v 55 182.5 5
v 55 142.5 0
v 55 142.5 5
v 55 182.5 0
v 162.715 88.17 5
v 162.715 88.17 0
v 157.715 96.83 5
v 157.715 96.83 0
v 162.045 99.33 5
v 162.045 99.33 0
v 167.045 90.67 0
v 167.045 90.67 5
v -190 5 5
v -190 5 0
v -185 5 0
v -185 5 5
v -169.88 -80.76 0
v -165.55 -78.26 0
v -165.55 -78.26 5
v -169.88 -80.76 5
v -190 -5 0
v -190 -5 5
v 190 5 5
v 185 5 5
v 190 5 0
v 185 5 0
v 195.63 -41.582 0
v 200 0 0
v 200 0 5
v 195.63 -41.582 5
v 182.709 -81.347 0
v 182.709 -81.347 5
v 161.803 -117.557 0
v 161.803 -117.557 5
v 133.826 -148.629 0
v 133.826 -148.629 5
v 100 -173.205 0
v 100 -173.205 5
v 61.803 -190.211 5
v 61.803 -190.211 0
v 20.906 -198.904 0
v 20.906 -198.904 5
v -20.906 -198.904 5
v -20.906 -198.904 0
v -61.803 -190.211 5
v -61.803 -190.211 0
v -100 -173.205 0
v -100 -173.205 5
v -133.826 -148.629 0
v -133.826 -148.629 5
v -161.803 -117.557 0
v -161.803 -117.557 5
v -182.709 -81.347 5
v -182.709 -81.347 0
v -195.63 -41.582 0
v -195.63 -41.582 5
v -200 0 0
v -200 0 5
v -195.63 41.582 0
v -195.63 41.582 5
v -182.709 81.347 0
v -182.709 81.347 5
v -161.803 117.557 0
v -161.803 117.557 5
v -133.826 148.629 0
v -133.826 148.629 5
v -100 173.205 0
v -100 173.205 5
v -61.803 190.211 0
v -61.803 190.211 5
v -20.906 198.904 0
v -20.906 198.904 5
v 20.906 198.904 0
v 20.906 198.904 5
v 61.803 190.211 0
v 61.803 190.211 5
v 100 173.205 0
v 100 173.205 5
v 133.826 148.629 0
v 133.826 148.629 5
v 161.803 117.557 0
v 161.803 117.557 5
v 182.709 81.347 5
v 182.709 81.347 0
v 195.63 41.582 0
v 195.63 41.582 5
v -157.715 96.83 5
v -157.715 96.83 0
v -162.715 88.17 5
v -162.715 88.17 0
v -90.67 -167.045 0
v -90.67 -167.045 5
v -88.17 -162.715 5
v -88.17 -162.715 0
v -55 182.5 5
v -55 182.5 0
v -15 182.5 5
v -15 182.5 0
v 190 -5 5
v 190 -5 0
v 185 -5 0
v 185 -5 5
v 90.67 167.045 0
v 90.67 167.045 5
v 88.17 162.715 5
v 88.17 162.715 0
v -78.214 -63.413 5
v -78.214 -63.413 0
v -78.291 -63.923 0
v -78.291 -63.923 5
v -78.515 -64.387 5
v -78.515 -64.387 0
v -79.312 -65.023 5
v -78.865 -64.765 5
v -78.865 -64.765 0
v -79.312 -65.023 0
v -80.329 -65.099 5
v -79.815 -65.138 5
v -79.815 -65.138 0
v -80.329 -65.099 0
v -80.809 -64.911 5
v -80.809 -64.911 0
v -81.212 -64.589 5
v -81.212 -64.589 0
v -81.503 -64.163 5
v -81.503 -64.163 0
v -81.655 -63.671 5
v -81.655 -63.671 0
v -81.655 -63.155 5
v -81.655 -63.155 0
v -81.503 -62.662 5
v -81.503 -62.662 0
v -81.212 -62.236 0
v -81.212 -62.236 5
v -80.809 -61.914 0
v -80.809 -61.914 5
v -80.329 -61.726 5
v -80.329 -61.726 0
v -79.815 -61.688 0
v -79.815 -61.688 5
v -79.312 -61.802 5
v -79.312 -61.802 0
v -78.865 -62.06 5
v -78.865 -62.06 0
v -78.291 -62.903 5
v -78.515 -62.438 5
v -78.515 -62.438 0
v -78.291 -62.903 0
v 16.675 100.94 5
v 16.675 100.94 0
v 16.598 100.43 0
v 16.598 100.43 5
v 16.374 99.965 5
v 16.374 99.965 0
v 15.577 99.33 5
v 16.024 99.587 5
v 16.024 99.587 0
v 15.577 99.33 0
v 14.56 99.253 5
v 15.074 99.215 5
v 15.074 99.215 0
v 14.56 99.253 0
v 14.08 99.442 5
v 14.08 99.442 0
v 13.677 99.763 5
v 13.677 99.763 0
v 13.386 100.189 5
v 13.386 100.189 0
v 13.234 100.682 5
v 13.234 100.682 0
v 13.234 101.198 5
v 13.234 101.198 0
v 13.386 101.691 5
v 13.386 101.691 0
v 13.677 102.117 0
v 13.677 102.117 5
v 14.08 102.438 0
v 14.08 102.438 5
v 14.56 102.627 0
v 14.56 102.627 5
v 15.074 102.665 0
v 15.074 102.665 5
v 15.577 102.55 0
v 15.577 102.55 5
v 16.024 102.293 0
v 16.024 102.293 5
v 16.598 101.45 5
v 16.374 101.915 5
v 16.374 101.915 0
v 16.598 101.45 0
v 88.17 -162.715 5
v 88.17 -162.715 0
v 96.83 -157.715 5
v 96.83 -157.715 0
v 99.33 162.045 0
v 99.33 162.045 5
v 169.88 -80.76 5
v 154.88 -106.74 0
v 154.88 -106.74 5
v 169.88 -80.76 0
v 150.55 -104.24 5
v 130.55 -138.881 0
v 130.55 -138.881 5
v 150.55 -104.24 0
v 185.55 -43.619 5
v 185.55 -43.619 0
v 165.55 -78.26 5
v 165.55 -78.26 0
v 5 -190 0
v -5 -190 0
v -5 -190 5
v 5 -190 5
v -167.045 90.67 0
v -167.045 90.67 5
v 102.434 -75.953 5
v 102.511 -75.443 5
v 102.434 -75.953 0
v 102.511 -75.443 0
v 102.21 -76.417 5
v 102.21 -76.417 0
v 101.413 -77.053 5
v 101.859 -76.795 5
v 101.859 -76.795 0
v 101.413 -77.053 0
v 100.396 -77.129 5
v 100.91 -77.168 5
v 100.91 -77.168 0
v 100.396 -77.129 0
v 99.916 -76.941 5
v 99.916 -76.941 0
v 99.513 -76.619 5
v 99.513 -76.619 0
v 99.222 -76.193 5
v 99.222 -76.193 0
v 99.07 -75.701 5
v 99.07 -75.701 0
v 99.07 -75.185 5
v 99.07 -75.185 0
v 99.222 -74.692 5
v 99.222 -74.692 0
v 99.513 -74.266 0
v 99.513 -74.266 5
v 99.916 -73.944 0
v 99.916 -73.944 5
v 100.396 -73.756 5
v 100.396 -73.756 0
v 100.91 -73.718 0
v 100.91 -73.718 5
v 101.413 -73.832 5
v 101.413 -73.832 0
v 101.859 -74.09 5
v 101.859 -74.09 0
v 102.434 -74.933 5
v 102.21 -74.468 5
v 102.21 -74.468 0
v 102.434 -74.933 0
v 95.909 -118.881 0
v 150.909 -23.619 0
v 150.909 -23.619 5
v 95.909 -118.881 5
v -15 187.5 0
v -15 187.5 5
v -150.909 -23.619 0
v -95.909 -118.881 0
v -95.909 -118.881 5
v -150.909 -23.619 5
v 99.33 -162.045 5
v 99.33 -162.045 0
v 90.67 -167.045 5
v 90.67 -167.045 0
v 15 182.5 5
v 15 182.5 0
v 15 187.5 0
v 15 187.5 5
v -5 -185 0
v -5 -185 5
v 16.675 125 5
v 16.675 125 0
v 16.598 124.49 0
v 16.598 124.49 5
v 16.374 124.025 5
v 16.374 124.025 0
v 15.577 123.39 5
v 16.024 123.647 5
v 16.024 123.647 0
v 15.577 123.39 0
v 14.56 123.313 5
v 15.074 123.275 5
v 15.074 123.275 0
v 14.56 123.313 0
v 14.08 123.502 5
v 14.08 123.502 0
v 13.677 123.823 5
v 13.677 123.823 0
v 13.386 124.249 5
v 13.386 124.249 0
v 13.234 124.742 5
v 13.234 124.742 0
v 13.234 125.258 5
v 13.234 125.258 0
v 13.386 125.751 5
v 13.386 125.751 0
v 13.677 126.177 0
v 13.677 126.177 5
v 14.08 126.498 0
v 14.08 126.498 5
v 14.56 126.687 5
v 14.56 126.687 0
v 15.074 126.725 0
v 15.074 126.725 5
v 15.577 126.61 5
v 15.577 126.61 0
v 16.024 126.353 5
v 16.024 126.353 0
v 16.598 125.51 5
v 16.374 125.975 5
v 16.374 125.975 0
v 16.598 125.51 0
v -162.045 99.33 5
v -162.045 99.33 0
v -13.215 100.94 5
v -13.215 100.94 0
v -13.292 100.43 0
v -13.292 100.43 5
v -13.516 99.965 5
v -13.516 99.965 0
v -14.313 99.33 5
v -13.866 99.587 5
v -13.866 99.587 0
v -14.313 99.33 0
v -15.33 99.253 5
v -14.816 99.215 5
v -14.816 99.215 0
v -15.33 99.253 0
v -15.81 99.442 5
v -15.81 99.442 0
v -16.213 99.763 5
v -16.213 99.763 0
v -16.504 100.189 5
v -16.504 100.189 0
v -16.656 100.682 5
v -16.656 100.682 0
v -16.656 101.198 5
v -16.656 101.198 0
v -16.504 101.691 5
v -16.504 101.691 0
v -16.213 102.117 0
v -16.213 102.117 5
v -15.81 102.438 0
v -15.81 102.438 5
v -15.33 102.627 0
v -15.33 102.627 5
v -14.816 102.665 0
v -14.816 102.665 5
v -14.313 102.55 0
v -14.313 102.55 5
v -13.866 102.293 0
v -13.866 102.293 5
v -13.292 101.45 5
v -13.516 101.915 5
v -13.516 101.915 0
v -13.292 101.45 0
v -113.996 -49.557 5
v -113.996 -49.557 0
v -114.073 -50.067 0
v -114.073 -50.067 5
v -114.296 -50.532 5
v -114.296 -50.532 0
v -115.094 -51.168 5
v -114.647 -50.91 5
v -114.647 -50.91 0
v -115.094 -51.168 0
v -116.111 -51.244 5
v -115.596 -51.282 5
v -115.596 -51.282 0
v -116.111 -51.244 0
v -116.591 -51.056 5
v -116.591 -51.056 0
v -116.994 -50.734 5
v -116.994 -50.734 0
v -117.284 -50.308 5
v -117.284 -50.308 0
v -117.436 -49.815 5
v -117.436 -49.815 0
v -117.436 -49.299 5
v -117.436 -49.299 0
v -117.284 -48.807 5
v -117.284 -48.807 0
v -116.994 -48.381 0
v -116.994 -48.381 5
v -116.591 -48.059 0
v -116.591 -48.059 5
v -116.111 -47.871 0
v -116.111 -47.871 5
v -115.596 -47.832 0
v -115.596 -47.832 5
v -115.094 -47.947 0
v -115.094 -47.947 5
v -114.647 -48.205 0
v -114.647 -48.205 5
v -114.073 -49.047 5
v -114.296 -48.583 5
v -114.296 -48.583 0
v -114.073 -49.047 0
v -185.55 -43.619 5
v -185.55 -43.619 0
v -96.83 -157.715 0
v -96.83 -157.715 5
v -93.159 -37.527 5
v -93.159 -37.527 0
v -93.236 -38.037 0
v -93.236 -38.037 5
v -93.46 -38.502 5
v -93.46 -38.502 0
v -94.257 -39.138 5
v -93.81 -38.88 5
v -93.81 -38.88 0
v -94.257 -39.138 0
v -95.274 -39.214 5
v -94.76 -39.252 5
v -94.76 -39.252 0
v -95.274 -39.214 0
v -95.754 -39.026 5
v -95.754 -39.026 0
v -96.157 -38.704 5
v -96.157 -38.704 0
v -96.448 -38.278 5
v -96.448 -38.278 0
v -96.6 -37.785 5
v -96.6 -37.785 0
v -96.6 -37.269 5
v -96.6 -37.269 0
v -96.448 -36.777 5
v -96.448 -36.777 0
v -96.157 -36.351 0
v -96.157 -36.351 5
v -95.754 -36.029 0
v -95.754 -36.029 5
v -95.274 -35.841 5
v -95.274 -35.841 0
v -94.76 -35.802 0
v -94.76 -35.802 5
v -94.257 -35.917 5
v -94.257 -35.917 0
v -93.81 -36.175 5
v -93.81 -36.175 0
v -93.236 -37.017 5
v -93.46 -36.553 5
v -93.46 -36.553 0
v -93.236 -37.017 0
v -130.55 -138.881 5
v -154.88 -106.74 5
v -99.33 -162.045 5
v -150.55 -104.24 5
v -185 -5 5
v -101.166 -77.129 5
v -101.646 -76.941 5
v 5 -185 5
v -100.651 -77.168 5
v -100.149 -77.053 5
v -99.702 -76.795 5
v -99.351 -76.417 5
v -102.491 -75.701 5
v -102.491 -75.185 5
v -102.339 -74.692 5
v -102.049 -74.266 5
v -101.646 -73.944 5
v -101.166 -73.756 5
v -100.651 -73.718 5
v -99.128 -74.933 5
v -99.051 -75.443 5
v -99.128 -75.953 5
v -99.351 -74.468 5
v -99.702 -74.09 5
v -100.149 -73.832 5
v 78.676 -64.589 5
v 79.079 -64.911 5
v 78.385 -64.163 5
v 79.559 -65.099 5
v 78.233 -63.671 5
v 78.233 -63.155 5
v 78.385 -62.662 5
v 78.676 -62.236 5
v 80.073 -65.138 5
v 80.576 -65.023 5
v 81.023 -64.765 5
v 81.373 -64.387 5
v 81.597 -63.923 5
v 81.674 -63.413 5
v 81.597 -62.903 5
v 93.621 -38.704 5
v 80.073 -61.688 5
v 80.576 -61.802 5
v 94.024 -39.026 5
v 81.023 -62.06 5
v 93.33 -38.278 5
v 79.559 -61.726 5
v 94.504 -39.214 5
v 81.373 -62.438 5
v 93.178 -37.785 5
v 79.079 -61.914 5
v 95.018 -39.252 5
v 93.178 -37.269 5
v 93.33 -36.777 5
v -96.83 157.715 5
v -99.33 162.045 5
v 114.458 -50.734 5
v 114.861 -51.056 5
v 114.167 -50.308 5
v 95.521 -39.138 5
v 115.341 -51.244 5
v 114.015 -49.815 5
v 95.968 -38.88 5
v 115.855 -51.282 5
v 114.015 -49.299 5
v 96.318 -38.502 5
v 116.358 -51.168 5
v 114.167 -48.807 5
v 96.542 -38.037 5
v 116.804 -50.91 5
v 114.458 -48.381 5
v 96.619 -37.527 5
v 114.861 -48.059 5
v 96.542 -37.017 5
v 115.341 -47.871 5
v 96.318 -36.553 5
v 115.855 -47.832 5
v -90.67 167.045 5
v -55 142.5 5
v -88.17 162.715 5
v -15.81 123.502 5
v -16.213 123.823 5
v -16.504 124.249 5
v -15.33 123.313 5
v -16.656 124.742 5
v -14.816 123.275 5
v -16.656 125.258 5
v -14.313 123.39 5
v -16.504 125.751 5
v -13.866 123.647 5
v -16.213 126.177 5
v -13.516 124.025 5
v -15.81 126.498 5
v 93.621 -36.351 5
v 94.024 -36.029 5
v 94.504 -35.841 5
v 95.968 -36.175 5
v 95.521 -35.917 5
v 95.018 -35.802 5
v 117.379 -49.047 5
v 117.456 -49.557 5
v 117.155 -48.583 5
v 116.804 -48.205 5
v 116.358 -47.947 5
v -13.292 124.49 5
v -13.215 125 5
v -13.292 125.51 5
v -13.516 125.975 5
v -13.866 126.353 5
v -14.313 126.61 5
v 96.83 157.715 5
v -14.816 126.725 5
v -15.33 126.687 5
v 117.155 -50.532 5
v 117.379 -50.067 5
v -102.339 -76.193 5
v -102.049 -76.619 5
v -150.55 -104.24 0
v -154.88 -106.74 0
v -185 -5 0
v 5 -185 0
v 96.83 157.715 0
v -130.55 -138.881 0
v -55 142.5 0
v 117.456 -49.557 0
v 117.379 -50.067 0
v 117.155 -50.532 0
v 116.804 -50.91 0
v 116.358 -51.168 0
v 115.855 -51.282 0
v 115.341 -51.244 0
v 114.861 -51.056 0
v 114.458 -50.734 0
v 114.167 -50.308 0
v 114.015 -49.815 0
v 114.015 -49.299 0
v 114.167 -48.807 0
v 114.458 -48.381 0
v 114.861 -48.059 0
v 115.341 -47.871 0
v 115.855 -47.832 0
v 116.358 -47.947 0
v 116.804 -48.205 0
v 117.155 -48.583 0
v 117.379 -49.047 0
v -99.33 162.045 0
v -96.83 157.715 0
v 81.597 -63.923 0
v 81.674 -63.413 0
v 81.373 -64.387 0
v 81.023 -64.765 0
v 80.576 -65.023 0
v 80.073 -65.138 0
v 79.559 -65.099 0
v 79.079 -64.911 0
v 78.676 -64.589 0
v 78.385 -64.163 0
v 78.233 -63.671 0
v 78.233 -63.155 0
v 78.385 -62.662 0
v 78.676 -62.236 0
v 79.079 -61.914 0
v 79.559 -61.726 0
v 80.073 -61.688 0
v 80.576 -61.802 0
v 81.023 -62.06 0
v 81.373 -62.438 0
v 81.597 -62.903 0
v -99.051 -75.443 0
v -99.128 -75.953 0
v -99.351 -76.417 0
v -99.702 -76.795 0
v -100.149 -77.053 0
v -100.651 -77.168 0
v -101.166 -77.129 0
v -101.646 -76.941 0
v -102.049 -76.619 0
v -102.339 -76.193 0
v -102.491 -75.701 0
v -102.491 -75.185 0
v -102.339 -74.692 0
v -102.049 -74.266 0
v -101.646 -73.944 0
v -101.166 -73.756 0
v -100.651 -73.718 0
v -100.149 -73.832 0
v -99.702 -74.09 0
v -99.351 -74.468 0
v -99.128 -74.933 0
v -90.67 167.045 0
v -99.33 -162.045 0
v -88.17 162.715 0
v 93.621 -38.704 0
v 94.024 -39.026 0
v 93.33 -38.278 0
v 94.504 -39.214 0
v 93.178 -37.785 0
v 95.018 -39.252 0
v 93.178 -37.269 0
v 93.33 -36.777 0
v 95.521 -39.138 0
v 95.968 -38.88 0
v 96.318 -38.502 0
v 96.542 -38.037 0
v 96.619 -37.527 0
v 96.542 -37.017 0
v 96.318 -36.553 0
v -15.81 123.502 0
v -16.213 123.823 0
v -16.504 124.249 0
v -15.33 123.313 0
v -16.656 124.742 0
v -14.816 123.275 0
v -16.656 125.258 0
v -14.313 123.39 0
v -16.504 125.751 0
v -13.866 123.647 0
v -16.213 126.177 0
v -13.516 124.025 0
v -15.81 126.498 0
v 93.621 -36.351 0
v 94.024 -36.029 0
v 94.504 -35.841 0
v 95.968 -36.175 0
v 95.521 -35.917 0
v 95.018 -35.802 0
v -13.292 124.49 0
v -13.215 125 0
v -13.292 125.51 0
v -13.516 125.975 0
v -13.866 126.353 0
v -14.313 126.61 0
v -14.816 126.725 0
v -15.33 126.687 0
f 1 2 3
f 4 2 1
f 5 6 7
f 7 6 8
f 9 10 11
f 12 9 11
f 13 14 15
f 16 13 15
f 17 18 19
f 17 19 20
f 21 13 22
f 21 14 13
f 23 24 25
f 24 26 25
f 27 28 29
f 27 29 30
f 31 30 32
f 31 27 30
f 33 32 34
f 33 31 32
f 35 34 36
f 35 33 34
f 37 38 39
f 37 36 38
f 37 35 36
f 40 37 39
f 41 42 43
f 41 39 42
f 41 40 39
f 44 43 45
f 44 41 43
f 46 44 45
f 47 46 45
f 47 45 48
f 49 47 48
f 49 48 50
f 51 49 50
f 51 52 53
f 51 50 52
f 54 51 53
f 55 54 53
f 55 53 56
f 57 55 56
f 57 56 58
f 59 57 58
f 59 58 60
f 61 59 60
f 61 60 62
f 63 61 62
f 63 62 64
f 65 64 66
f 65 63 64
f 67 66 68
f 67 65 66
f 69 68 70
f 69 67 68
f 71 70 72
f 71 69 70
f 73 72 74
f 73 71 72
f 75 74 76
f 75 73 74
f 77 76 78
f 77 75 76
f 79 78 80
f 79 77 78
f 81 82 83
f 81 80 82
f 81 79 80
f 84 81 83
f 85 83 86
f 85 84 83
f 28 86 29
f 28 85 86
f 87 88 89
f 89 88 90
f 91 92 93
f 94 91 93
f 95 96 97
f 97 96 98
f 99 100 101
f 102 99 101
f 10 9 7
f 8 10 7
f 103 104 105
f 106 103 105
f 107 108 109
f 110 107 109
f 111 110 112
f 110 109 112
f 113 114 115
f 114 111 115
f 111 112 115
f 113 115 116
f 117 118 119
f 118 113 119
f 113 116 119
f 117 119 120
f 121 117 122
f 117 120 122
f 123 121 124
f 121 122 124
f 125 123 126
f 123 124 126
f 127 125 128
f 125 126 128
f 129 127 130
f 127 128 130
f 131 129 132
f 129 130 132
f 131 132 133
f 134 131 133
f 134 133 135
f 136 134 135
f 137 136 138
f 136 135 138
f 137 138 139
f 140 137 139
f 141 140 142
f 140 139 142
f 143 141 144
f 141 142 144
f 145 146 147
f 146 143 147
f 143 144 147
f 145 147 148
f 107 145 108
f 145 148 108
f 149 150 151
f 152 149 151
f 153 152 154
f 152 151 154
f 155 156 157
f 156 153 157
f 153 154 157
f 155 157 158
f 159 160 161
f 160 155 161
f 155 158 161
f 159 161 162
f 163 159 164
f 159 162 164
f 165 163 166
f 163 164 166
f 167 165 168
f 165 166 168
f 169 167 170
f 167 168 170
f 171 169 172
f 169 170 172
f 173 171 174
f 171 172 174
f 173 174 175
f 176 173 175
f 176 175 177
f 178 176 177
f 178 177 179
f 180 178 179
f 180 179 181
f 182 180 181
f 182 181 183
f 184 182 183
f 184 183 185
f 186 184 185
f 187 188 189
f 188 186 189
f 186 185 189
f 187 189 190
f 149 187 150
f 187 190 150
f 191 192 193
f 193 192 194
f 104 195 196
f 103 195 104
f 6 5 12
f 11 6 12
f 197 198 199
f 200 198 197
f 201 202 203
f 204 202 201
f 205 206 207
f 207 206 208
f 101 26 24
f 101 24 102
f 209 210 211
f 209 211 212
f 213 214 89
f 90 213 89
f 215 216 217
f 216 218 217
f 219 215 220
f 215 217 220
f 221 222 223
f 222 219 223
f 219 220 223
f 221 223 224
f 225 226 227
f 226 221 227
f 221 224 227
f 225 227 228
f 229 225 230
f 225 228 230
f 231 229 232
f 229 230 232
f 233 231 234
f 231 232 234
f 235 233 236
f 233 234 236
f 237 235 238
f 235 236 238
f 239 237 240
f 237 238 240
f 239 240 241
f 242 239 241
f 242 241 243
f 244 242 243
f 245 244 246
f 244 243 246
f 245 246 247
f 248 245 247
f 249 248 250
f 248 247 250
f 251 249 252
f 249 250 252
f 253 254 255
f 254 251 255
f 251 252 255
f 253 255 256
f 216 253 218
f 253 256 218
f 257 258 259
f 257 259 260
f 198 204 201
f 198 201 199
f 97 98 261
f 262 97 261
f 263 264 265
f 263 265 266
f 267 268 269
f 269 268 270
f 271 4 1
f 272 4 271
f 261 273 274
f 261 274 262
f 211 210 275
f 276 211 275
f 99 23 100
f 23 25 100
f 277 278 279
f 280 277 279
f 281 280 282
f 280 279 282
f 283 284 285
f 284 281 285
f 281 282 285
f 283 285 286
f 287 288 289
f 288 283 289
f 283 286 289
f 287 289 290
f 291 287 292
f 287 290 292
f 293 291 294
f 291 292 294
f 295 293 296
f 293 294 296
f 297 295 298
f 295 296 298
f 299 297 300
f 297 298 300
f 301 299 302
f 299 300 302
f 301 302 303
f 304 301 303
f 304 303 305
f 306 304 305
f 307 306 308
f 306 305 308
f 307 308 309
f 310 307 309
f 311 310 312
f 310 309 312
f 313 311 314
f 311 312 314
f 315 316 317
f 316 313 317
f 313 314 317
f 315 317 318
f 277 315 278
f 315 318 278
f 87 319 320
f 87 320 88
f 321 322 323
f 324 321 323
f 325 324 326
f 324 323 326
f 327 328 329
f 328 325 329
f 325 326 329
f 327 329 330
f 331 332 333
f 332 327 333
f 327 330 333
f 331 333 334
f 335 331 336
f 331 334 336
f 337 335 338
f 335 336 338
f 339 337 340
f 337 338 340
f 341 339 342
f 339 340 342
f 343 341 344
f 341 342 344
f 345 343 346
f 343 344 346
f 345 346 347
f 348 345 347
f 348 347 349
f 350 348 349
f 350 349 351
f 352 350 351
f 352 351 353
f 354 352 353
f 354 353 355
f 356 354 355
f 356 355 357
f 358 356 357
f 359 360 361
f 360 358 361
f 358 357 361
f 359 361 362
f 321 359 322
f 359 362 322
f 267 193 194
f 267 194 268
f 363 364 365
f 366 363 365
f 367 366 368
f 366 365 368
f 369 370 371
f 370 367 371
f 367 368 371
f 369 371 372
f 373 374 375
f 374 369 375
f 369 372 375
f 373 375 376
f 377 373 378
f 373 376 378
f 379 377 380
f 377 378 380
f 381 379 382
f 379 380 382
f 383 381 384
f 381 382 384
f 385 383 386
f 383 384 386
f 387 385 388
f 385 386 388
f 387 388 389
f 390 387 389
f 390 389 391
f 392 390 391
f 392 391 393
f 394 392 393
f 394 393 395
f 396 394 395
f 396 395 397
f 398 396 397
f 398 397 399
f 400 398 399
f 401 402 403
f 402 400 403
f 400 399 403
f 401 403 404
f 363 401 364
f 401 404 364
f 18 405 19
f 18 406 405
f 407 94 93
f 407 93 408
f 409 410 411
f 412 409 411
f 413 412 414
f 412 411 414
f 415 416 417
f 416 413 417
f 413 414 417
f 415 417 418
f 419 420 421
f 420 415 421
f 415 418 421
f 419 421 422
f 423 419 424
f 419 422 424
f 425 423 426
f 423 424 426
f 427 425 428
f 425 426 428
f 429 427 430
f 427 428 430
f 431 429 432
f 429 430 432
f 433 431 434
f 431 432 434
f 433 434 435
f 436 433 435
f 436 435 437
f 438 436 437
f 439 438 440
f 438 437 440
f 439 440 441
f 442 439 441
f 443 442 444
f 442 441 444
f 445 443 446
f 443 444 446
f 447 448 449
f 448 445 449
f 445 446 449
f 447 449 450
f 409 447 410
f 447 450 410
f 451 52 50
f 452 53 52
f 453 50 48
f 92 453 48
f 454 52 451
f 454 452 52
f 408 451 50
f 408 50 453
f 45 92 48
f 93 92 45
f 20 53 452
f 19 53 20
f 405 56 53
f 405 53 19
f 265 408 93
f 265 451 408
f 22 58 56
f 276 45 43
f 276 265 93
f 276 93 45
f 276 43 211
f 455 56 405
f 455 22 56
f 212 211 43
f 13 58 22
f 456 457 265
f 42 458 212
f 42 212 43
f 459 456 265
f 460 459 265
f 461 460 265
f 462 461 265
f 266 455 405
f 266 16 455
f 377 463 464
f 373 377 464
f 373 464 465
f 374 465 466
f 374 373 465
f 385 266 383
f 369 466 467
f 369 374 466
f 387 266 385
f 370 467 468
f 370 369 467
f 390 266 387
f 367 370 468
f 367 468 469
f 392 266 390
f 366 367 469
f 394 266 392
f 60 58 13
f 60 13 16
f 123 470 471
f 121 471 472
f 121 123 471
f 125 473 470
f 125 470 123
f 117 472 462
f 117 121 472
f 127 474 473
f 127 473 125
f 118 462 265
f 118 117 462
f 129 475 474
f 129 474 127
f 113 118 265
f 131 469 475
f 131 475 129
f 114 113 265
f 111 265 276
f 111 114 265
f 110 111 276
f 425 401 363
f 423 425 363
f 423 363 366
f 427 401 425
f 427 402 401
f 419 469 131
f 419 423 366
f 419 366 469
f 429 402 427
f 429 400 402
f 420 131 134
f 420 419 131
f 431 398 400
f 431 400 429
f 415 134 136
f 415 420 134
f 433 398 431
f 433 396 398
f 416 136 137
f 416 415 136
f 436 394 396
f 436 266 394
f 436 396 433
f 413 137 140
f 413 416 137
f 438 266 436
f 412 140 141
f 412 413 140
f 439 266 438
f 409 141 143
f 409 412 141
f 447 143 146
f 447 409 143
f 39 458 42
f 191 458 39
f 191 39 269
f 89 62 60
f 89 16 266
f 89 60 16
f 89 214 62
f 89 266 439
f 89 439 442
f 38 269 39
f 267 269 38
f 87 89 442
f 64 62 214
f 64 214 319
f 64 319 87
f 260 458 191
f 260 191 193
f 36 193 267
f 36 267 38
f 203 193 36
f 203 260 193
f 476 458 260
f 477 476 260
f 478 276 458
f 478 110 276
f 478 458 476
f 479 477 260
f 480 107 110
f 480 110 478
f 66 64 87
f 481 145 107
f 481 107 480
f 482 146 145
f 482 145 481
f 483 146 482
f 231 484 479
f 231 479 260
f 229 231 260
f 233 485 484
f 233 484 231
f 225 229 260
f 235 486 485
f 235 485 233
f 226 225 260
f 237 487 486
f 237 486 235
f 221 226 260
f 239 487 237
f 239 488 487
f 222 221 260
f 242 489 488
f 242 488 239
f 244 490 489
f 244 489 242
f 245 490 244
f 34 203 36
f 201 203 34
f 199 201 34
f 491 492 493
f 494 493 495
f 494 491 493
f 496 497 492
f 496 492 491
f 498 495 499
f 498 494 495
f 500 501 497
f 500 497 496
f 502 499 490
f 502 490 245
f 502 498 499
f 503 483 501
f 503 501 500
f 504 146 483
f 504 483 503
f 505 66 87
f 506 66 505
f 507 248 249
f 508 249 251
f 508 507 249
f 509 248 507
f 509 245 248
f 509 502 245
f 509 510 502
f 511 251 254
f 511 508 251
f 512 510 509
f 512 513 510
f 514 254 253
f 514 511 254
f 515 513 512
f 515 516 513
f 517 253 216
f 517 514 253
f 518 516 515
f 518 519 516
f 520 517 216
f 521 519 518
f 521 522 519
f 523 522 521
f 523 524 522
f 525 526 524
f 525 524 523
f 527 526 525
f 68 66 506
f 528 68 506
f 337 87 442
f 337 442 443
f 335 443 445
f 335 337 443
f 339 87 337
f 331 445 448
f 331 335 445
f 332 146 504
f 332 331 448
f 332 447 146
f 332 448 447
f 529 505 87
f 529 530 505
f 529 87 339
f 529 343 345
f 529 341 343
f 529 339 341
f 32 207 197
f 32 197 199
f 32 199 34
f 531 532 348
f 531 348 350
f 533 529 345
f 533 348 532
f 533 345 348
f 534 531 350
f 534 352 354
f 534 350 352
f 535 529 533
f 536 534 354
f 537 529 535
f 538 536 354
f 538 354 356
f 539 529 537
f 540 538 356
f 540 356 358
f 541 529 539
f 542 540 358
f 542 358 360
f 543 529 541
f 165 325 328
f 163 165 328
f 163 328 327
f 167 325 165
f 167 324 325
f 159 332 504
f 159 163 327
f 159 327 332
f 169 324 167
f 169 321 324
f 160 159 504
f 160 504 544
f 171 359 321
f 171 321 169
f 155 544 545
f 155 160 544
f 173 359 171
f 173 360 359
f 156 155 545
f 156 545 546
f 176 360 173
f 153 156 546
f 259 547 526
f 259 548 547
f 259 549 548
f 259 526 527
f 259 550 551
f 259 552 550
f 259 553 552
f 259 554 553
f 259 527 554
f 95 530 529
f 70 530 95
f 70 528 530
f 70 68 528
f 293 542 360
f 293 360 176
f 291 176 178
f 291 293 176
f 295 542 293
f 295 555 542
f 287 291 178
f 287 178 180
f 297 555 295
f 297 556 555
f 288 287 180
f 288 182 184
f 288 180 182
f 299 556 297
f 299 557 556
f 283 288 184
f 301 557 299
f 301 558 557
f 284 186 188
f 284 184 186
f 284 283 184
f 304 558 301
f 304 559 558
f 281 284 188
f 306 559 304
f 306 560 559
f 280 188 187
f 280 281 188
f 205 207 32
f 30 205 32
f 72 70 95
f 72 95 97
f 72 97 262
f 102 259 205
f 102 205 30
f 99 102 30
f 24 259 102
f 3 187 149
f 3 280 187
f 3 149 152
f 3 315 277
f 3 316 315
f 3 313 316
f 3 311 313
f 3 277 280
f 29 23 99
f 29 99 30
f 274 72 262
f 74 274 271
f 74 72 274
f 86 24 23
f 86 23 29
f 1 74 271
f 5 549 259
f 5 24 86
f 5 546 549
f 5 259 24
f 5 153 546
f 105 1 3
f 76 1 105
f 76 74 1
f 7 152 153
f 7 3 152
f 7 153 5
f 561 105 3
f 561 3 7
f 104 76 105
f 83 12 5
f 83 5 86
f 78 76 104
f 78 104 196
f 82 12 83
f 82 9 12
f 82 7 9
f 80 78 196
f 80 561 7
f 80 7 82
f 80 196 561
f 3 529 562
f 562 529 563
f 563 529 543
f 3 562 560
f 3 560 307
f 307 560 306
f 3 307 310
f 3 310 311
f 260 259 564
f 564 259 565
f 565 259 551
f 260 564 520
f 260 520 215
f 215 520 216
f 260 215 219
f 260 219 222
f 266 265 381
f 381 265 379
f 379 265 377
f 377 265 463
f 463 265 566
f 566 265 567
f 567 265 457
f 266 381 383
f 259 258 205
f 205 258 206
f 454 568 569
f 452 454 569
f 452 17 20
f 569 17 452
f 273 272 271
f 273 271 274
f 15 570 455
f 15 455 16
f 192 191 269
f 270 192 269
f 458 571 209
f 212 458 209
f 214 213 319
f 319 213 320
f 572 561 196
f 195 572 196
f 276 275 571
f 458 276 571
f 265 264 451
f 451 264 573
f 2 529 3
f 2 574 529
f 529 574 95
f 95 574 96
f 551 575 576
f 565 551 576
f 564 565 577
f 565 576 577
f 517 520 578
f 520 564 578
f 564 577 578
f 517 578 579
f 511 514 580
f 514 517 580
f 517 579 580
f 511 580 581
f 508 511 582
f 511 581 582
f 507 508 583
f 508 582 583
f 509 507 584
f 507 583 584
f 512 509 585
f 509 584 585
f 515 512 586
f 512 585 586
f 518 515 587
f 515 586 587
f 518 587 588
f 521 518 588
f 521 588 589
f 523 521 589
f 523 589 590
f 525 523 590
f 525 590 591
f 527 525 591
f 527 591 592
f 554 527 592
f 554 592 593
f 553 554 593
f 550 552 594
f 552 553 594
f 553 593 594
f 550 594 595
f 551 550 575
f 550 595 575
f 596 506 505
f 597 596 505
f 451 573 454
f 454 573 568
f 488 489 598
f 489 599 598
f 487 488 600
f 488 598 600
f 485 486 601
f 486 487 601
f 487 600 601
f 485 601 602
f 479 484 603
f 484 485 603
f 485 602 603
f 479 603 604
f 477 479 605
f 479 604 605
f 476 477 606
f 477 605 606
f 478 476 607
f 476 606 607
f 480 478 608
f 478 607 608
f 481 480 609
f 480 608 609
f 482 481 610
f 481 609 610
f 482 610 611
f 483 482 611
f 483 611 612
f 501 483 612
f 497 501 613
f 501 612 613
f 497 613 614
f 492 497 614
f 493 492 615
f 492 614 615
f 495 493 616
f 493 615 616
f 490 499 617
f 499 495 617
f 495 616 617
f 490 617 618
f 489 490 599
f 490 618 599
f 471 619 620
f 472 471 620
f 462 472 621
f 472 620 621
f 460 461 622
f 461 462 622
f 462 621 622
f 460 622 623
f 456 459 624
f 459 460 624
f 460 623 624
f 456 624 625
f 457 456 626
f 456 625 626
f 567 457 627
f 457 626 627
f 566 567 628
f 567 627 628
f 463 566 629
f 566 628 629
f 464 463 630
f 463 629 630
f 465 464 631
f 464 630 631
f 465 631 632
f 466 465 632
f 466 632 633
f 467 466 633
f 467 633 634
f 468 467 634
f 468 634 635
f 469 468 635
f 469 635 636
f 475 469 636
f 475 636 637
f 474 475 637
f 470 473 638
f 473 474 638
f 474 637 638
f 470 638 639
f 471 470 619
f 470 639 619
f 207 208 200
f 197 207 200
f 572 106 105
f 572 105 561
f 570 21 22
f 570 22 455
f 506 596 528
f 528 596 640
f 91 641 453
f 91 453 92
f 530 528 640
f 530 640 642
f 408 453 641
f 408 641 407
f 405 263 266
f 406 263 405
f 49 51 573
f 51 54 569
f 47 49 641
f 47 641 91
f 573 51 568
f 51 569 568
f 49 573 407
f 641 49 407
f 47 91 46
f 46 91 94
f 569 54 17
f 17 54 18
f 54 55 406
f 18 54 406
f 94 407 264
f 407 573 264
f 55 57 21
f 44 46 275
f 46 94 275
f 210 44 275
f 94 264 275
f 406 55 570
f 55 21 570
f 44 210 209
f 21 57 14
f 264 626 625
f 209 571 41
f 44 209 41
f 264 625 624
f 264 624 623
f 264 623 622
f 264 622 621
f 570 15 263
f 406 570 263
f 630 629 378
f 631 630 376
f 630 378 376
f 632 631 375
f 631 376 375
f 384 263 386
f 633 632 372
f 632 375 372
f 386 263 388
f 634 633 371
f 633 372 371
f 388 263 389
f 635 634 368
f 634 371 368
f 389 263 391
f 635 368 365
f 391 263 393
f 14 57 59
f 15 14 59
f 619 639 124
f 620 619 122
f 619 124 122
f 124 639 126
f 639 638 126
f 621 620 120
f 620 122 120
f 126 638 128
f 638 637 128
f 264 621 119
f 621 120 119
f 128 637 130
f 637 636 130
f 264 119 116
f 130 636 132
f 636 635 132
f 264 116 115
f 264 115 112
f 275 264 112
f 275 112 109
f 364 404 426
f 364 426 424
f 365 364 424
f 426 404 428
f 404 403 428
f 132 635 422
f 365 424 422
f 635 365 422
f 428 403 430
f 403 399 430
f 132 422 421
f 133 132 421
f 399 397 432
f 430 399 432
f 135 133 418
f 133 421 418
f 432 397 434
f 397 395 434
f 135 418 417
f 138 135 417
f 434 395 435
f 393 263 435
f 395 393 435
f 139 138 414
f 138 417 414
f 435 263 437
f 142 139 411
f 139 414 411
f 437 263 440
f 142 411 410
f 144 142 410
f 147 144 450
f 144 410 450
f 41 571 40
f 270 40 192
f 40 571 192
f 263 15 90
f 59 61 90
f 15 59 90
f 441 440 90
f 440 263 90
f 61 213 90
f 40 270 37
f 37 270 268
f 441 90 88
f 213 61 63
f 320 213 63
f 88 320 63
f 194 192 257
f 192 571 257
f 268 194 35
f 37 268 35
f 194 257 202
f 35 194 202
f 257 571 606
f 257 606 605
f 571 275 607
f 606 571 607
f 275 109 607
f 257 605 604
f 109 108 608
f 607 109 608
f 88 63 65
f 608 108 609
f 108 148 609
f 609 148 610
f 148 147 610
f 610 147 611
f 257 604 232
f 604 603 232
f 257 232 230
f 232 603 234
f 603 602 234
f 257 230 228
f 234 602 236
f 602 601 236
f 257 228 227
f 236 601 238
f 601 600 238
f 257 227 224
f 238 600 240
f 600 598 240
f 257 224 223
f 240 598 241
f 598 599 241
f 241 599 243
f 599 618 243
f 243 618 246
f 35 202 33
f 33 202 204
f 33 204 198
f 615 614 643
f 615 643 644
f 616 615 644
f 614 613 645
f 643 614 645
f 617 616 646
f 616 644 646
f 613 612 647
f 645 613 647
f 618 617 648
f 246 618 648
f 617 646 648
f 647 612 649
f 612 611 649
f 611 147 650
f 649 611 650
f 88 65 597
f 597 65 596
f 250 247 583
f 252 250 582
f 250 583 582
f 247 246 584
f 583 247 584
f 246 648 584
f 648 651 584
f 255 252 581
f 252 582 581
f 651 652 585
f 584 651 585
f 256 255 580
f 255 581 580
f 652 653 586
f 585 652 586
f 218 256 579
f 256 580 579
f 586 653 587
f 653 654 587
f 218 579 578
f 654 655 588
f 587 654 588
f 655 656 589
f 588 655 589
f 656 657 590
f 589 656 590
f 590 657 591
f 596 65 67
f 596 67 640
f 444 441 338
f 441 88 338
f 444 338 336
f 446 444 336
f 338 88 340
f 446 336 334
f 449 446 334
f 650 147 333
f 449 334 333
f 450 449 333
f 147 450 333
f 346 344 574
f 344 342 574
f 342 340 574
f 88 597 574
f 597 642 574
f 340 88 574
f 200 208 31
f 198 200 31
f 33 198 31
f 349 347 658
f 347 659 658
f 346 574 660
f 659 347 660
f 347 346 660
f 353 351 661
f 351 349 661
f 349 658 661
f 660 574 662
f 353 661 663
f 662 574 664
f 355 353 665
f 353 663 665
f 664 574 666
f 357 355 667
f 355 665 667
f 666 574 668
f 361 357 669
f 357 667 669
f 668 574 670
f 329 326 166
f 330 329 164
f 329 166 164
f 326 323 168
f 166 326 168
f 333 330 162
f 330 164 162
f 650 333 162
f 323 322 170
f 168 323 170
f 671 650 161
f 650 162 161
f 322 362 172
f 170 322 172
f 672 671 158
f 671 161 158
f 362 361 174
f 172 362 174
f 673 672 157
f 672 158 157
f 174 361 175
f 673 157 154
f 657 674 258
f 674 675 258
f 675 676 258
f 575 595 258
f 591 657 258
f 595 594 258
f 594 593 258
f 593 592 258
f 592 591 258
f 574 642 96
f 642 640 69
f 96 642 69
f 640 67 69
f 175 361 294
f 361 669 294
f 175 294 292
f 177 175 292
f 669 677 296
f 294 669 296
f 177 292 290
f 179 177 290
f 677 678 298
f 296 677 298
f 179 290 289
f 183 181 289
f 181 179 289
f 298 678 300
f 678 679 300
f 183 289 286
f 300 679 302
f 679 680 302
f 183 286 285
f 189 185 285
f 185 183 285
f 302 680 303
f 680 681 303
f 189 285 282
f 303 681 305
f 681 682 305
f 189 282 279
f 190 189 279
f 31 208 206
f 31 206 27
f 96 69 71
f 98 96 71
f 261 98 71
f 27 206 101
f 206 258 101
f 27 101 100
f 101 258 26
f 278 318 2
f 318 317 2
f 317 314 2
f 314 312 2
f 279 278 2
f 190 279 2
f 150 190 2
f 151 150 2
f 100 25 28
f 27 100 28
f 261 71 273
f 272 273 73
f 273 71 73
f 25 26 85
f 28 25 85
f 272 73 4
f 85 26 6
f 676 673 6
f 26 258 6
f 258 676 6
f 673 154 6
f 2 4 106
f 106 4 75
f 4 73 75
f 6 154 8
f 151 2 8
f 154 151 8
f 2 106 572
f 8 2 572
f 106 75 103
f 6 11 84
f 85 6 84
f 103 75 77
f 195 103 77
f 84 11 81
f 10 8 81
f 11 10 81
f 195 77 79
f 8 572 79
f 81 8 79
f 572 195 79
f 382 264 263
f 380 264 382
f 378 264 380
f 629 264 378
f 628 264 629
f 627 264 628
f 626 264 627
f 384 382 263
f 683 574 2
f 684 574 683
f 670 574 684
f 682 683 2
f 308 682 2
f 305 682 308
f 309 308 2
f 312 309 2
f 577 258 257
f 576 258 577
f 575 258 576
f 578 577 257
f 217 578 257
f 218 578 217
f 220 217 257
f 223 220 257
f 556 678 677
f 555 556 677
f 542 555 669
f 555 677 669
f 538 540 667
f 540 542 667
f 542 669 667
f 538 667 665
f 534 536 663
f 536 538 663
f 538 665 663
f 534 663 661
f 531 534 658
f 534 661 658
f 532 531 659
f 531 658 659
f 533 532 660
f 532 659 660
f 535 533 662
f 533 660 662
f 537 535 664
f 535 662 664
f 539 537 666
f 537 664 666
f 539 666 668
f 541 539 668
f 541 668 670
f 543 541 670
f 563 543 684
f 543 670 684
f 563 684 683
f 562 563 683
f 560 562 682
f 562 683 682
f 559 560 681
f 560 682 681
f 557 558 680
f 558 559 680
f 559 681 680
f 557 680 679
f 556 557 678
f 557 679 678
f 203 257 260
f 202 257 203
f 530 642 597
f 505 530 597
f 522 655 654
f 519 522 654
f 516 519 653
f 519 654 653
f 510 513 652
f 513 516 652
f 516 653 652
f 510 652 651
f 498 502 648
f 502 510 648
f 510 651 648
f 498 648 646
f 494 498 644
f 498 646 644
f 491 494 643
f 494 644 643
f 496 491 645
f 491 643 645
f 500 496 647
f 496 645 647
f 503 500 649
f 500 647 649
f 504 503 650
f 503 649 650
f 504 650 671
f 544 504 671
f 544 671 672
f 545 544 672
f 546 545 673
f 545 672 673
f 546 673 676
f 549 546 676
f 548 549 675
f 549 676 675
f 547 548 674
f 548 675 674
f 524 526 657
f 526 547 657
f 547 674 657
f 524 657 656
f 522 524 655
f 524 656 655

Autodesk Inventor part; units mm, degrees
ref_plane "YZ Plane" through (0, 0, 0) normal (1, 0, 0) x (0, 1, 0)
ref_plane "XZ Plane" through (0, 0, 0) normal (0, 1, 0) x (-1, 0, 0)
ref_plane "XY Plane" through (0, 0, 0) normal (0, 0, 1) x (1, 0, 0)
sketch "Sketch1" plane through (0, 0, 0) normal (0, 0, 1) x (1, 0, 0)
  circle A0 centre (0, 0) radius 200
  line L0 (90.6699, 167.0448) -> (88.1699, 162.7147)
  line L1 (96.8301, 157.7147) -> (99.3301, 162.0448)
  line L2 (162.0448, 99.3301) -> (157.7147, 96.8301)
  line L3 (162.7147, 88.1699) -> (167.0448, 90.6699)
  line L4 (185, 5) -> (190, 5)
  line L5 (190, -5) -> (185, -5)
  line L6 (88.1699, -162.7147) -> (96.8301, -157.7147)
  line L7 (99.3301, -162.0448) -> (90.6699, -167.0448)
  line L8 (-5, -190) -> (-5, -185)
  line L9 (5, -185) -> (5, -190)
  line L10 (-99.3301, -162.0448) -> (-90.6699, -167.0448)
  line L11 (-88.1699, -162.7147) -> (-96.8301, -157.7147)
  line L12 (-190, 5) -> (-190, -5)
  line L13 (-190, -5) -> (-185, -5)
  line L14 (-185, -5) -> (-185, 5)
  line L15 (-167.0448, 90.6699) -> (-162.0448, 99.3301)
  line L16 (-157.7147, 96.8301) -> (-162.7147, 88.1699)
  line L17 (-99.3301, 162.0448) -> (-90.6699, 167.0448)
  line L18 (-88.1699, 162.7147) -> (-96.8301, 157.7147)
  line L19 (-190, -5) -> (-190, 5)
  line L20 (-185, 5) -> (-185, -5)
  line L21 (88.1699, 162.7147) -> (96.8301, 157.7147)
  line L22 (99.3301, 162.0448) -> (90.6699, 167.0448)
  line L23 (162.7147, 88.1699) -> (157.7147, 96.8301)
  line L24 (162.0448, 99.3301) -> (167.0448, 90.6699)
  line L25 (185, 5) -> (185, -5)
  line L26 (190, 5) -> (190, -5)
  line L27 (96.8301, -157.7147) -> (99.3301, -162.0448)
  line L28 (88.1699, -162.7147) -> (90.6699, -167.0448)
  line L29 (-5, -185) -> (5, -185)
  line L30 (-5, -190) -> (5, -190)
  line L31 (-99.3301, -162.0448) -> (-96.8301, -157.7147)
  line L32 (-90.6699, -167.0448) -> (-88.1699, -162.7147)
  line L33 (-190, 5) -> (-185, 5)
  line L34 (-162.0448, 99.3301) -> (-157.7147, 96.8301)
  line L35 (-167.0448, 90.6699) -> (-162.7147, 88.1699)
  line L36 (-99.3301, 162.0448) -> (-96.8301, 157.7147)
  line L37 (-90.6699, 167.0448) -> (-88.1699, 162.7147)
  line L38 (0, 142.5) -> (55, 142.5)
  line L39 (55, 142.5) -> (55, 182.5)
  line L40 (55, 182.5) -> (15, 182.5)
  line L41 (15, 182.5) -> (15, 187.5)
  line L42 (15, 187.5) -> (0, 187.5)
  line L43 (0, 142.5) -> (-55, 142.5)
  line L44 (-55, 142.5) -> (-55, 182.5)
  line L45 (-55, 182.5) -> (-15, 182.5)
  line L46 (-15, 182.5) -> (-15, 187.5)
  line L47 (-15, 187.5) -> (0, 187.5)
  line L48 (-123.4086, -71.25) -> (-95.9086, -118.8814)
  line L49 (-150.5496, -104.2404) -> (-154.8798, -106.7404)
  line L50 (-154.8798, -106.7404) -> (-162.3798, -93.75)
  line L51 (-95.9086, -118.8814) -> (-130.5496, -138.8814)
  line L52 (-130.5496, -138.8814) -> (-150.5496, -104.2404)
  line L53 (-123.4086, -71.25) -> (-150.9086, -23.6186)
  line L54 (-165.5496, -78.2596) -> (-169.8798, -80.7596)
  line L55 (-150.9086, -23.6186) -> (-185.5496, -43.6186)
  line L56 (-185.5496, -43.6186) -> (-165.5496, -78.2596)
  line L57 (-169.8798, -80.7596) -> (-162.3798, -93.75)
  line L58 (123.4086, -71.25) -> (150.9086, -23.6186)
  line L59 (165.5496, -78.2596) -> (169.8798, -80.7596)
  line L60 (169.8798, -80.7596) -> (162.3798, -93.75)
  line L61 (150.9086, -23.6186) -> (185.5496, -43.6186)
  line L62 (185.5496, -43.6186) -> (165.5496, -78.2596)
  line L63 (123.4086, -71.25) -> (95.9086, -118.8814)
  line L64 (150.5496, -104.2404) -> (154.8798, -106.7404)
  line L65 (95.9086, -118.8814) -> (130.5496, -138.8814)
  line L66 (130.5496, -138.8814) -> (150.5496, -104.2404)
  line L67 (154.8798, -106.7404) -> (162.3798, -93.75)
  line L68 (157.7147, 96.8301) -> (162.0448, 99.3301)
  line L69 (167.0448, 90.6699) -> (162.7147, 88.1699)
  line L70 (-99.3301, -162.0448) -> (-96.8301, -157.7147)
  line L71 (-88.1699, -162.7147) -> (-90.6699, -167.0448)
  line L72 (-99.3301, -162.0448) -> (-96.8301, -157.7147)
  line L73 (-88.1699, -162.7147) -> (-90.6699, -167.0448)
  line L74 (-99.3301, -162.0448) -> (-90.6699, -167.0448)
  circle A1 centre (14.945, 125) radius 1.73
  circle A2 centre (14.945, 100.94) radius 1.73
  circle A3 centre (-14.945, 125) radius 1.73
  circle A4 centre (-14.945, 100.94) radius 1.73
  circle A5 centre (-100.7807, -75.4427) radius 1.73
  circle A6 centre (-115.7257, -49.5573) radius 1.73
  circle A7 centre (-79.9441, -63.4127) radius 1.73
  circle A8 centre (-94.8891, -37.5273) radius 1.73
  circle A9 centre (115.7257, -49.5573) radius 1.73
  circle A10 centre (100.7807, -75.4427) radius 1.73
  circle A11 centre (94.8891, -37.5273) radius 1.73
  circle A12 centre (79.9441, -63.4127) radius 1.73
  dimension "d15" = 45
  dimension "d17" = 40
  dimension "d18" = 40
  dimension "d21" = 360
  dimension "d27" = 3.46
  dimension "d48" = 360
extrude "Extrusion1" add sketch "Sketch1" along normal blind 5 contours A0 | A1 | A2 | A3 | A4 | A5 | A6 | A7 | A8 | A9 | A10 | A11 | A12
extrude "Extrusion5" cut sketch "Sketch1" along normal blind 5 contours A1 | A2 | A3 | A4 | A5 | A6 | A7 | A8 | A9 | A10 | A11 | A12
properties part number "debanhxe"
